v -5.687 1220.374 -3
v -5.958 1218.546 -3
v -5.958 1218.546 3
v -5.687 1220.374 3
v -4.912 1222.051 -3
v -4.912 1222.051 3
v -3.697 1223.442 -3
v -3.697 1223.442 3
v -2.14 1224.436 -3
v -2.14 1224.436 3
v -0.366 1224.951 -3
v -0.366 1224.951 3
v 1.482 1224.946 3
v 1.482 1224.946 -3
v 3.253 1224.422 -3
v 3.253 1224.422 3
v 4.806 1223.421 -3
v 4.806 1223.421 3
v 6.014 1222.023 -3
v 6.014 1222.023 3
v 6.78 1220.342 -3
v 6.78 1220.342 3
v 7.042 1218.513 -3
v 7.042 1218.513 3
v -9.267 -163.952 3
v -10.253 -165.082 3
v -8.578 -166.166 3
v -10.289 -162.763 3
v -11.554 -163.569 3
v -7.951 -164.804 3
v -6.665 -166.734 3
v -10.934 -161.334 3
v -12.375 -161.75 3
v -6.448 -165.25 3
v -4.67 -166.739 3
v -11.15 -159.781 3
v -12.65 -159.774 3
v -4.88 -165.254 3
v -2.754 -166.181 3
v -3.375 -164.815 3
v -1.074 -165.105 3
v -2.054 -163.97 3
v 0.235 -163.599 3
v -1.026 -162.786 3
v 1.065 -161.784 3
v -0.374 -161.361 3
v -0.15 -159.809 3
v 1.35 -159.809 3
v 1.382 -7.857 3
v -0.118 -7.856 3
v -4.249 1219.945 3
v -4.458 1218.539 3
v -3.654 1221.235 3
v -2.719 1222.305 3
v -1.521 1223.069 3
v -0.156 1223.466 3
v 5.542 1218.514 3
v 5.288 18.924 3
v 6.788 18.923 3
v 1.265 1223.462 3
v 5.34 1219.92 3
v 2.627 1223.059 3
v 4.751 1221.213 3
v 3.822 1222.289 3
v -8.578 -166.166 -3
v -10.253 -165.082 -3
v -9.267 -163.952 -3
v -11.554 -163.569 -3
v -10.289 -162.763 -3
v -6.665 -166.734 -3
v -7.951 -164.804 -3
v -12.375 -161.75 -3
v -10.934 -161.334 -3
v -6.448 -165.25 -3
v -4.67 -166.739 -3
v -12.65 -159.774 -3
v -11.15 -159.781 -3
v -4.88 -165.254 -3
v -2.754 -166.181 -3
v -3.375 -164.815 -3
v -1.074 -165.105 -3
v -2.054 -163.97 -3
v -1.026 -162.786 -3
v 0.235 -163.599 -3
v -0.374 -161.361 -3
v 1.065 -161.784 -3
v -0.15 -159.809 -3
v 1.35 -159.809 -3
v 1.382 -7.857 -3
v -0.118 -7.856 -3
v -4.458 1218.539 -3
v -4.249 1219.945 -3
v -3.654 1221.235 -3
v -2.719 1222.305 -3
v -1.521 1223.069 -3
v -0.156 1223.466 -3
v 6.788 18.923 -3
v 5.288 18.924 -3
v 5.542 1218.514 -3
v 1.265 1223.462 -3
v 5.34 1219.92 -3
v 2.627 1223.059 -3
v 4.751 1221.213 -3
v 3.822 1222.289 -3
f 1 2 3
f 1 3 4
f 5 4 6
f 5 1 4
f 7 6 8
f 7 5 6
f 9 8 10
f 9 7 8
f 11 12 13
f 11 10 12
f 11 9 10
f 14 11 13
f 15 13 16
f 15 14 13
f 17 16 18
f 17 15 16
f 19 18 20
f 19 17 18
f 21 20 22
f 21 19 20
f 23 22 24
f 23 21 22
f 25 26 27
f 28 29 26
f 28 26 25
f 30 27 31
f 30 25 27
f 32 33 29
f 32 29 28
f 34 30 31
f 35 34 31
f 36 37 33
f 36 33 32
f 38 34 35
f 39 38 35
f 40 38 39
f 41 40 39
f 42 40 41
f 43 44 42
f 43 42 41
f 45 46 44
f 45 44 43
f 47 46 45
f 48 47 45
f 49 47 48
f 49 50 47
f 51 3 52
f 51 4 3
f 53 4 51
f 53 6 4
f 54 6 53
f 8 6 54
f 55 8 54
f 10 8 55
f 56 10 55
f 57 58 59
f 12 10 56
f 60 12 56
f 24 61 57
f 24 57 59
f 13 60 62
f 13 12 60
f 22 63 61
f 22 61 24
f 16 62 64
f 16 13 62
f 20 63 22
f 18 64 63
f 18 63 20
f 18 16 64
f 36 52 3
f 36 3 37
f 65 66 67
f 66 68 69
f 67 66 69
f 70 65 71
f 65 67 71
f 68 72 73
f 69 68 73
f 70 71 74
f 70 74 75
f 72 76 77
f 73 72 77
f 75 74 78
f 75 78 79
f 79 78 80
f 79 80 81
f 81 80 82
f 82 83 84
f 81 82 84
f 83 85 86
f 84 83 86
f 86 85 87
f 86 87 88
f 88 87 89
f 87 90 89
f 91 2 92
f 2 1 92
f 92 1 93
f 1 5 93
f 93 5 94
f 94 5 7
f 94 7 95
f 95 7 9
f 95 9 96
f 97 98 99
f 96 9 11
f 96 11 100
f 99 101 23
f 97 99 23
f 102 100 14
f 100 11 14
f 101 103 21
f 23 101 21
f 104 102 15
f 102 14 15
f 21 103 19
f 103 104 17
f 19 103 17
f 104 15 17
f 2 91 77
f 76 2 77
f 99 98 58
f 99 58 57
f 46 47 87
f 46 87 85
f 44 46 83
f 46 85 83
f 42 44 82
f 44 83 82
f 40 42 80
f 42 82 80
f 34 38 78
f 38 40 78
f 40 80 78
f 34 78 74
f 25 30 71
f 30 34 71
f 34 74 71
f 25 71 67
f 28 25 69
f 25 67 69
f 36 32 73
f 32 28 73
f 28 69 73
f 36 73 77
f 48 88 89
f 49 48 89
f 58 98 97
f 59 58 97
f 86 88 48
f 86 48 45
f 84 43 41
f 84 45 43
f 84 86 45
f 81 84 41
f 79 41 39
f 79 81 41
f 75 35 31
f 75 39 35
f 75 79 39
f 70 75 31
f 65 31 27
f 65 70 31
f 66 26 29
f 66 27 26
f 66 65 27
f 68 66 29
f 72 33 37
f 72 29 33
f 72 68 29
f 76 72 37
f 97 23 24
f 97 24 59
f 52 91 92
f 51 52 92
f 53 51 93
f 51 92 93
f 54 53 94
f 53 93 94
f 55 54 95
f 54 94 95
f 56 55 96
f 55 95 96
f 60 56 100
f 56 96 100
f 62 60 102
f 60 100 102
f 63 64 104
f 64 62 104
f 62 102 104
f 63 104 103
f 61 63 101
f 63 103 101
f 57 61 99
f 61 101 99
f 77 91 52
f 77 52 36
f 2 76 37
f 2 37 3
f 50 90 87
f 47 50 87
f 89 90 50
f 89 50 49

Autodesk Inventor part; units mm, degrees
ref_plane "YZ Plane" through (0, 0, 0) normal (1, 0, 0) x (0, 1, 0)
ref_plane "XZ Plane" through (0, 0, 0) normal (0, 1, 0) x (-1, 0, 0)
ref_plane "Work Plane1" through (4.7798, -19.0607, 0) normal (0, 0, 1) x (1, -0.0002116, 0)
sketch "Sketch1" plane through (4.7798, -19.0607, 0) normal (0, 0, 1) x (1, -0.0002116, 0)
  circle A0 centre (-10.4, -140.7495) radius 4.3281 projected
  arc A1 (-17.3999, -140.717) -> (-3.4, -140.7495) centre (-10.4, -140.7495) ccw
  arc A2 (2, 1237.5744) -> (-10.9999, 1237.6046) centre (-4.5, 1237.5744) ccw
  line L0 (-17.3999, -140.717) -> (-10.9999, 1237.6046)
  line L1 (-3.4, -140.7495) -> (-3.4, 11.2032)
  line L2 (2, 1237.5744) -> (2, 37.9844)
  line L3 (0.5, 37.9844) -> (0.5, 1237.5744)
  arc A3 (0.5, 1237.5744) -> (-9.4999, 1237.5976) centre (-4.5, 1237.5744) ccw
  line L4 (-9.4999, 1237.5976) -> (-15.8999, -140.724)
  line L5 (-4.9, 11.2032) -> (-4.9, -140.7495)
  arc A4 (-15.8999, -140.724) -> (-4.9, -140.7495) centre (-10.4, -140.7495) ccw
  line L6 (-4.9, 11.2032) -> (-3.4, 11.2032)
  line L7 (0.5, 37.9844) -> (2, 37.9844)
  point P0 (-4.7838, 19.0597)
  dimension "d3" = 1.5
  dimension "d4" = 1.5
  dimension "d5" = 5.5
  dimension "d6" = 5
extrude "Extrusion1" add sketch "Sketch1" along normal mid plane 6 contours L0 A2 L2 L7 L3 A3 L4 A4 L5 L6 L1 A1
properties part number "FDM20-BandaX-01"
